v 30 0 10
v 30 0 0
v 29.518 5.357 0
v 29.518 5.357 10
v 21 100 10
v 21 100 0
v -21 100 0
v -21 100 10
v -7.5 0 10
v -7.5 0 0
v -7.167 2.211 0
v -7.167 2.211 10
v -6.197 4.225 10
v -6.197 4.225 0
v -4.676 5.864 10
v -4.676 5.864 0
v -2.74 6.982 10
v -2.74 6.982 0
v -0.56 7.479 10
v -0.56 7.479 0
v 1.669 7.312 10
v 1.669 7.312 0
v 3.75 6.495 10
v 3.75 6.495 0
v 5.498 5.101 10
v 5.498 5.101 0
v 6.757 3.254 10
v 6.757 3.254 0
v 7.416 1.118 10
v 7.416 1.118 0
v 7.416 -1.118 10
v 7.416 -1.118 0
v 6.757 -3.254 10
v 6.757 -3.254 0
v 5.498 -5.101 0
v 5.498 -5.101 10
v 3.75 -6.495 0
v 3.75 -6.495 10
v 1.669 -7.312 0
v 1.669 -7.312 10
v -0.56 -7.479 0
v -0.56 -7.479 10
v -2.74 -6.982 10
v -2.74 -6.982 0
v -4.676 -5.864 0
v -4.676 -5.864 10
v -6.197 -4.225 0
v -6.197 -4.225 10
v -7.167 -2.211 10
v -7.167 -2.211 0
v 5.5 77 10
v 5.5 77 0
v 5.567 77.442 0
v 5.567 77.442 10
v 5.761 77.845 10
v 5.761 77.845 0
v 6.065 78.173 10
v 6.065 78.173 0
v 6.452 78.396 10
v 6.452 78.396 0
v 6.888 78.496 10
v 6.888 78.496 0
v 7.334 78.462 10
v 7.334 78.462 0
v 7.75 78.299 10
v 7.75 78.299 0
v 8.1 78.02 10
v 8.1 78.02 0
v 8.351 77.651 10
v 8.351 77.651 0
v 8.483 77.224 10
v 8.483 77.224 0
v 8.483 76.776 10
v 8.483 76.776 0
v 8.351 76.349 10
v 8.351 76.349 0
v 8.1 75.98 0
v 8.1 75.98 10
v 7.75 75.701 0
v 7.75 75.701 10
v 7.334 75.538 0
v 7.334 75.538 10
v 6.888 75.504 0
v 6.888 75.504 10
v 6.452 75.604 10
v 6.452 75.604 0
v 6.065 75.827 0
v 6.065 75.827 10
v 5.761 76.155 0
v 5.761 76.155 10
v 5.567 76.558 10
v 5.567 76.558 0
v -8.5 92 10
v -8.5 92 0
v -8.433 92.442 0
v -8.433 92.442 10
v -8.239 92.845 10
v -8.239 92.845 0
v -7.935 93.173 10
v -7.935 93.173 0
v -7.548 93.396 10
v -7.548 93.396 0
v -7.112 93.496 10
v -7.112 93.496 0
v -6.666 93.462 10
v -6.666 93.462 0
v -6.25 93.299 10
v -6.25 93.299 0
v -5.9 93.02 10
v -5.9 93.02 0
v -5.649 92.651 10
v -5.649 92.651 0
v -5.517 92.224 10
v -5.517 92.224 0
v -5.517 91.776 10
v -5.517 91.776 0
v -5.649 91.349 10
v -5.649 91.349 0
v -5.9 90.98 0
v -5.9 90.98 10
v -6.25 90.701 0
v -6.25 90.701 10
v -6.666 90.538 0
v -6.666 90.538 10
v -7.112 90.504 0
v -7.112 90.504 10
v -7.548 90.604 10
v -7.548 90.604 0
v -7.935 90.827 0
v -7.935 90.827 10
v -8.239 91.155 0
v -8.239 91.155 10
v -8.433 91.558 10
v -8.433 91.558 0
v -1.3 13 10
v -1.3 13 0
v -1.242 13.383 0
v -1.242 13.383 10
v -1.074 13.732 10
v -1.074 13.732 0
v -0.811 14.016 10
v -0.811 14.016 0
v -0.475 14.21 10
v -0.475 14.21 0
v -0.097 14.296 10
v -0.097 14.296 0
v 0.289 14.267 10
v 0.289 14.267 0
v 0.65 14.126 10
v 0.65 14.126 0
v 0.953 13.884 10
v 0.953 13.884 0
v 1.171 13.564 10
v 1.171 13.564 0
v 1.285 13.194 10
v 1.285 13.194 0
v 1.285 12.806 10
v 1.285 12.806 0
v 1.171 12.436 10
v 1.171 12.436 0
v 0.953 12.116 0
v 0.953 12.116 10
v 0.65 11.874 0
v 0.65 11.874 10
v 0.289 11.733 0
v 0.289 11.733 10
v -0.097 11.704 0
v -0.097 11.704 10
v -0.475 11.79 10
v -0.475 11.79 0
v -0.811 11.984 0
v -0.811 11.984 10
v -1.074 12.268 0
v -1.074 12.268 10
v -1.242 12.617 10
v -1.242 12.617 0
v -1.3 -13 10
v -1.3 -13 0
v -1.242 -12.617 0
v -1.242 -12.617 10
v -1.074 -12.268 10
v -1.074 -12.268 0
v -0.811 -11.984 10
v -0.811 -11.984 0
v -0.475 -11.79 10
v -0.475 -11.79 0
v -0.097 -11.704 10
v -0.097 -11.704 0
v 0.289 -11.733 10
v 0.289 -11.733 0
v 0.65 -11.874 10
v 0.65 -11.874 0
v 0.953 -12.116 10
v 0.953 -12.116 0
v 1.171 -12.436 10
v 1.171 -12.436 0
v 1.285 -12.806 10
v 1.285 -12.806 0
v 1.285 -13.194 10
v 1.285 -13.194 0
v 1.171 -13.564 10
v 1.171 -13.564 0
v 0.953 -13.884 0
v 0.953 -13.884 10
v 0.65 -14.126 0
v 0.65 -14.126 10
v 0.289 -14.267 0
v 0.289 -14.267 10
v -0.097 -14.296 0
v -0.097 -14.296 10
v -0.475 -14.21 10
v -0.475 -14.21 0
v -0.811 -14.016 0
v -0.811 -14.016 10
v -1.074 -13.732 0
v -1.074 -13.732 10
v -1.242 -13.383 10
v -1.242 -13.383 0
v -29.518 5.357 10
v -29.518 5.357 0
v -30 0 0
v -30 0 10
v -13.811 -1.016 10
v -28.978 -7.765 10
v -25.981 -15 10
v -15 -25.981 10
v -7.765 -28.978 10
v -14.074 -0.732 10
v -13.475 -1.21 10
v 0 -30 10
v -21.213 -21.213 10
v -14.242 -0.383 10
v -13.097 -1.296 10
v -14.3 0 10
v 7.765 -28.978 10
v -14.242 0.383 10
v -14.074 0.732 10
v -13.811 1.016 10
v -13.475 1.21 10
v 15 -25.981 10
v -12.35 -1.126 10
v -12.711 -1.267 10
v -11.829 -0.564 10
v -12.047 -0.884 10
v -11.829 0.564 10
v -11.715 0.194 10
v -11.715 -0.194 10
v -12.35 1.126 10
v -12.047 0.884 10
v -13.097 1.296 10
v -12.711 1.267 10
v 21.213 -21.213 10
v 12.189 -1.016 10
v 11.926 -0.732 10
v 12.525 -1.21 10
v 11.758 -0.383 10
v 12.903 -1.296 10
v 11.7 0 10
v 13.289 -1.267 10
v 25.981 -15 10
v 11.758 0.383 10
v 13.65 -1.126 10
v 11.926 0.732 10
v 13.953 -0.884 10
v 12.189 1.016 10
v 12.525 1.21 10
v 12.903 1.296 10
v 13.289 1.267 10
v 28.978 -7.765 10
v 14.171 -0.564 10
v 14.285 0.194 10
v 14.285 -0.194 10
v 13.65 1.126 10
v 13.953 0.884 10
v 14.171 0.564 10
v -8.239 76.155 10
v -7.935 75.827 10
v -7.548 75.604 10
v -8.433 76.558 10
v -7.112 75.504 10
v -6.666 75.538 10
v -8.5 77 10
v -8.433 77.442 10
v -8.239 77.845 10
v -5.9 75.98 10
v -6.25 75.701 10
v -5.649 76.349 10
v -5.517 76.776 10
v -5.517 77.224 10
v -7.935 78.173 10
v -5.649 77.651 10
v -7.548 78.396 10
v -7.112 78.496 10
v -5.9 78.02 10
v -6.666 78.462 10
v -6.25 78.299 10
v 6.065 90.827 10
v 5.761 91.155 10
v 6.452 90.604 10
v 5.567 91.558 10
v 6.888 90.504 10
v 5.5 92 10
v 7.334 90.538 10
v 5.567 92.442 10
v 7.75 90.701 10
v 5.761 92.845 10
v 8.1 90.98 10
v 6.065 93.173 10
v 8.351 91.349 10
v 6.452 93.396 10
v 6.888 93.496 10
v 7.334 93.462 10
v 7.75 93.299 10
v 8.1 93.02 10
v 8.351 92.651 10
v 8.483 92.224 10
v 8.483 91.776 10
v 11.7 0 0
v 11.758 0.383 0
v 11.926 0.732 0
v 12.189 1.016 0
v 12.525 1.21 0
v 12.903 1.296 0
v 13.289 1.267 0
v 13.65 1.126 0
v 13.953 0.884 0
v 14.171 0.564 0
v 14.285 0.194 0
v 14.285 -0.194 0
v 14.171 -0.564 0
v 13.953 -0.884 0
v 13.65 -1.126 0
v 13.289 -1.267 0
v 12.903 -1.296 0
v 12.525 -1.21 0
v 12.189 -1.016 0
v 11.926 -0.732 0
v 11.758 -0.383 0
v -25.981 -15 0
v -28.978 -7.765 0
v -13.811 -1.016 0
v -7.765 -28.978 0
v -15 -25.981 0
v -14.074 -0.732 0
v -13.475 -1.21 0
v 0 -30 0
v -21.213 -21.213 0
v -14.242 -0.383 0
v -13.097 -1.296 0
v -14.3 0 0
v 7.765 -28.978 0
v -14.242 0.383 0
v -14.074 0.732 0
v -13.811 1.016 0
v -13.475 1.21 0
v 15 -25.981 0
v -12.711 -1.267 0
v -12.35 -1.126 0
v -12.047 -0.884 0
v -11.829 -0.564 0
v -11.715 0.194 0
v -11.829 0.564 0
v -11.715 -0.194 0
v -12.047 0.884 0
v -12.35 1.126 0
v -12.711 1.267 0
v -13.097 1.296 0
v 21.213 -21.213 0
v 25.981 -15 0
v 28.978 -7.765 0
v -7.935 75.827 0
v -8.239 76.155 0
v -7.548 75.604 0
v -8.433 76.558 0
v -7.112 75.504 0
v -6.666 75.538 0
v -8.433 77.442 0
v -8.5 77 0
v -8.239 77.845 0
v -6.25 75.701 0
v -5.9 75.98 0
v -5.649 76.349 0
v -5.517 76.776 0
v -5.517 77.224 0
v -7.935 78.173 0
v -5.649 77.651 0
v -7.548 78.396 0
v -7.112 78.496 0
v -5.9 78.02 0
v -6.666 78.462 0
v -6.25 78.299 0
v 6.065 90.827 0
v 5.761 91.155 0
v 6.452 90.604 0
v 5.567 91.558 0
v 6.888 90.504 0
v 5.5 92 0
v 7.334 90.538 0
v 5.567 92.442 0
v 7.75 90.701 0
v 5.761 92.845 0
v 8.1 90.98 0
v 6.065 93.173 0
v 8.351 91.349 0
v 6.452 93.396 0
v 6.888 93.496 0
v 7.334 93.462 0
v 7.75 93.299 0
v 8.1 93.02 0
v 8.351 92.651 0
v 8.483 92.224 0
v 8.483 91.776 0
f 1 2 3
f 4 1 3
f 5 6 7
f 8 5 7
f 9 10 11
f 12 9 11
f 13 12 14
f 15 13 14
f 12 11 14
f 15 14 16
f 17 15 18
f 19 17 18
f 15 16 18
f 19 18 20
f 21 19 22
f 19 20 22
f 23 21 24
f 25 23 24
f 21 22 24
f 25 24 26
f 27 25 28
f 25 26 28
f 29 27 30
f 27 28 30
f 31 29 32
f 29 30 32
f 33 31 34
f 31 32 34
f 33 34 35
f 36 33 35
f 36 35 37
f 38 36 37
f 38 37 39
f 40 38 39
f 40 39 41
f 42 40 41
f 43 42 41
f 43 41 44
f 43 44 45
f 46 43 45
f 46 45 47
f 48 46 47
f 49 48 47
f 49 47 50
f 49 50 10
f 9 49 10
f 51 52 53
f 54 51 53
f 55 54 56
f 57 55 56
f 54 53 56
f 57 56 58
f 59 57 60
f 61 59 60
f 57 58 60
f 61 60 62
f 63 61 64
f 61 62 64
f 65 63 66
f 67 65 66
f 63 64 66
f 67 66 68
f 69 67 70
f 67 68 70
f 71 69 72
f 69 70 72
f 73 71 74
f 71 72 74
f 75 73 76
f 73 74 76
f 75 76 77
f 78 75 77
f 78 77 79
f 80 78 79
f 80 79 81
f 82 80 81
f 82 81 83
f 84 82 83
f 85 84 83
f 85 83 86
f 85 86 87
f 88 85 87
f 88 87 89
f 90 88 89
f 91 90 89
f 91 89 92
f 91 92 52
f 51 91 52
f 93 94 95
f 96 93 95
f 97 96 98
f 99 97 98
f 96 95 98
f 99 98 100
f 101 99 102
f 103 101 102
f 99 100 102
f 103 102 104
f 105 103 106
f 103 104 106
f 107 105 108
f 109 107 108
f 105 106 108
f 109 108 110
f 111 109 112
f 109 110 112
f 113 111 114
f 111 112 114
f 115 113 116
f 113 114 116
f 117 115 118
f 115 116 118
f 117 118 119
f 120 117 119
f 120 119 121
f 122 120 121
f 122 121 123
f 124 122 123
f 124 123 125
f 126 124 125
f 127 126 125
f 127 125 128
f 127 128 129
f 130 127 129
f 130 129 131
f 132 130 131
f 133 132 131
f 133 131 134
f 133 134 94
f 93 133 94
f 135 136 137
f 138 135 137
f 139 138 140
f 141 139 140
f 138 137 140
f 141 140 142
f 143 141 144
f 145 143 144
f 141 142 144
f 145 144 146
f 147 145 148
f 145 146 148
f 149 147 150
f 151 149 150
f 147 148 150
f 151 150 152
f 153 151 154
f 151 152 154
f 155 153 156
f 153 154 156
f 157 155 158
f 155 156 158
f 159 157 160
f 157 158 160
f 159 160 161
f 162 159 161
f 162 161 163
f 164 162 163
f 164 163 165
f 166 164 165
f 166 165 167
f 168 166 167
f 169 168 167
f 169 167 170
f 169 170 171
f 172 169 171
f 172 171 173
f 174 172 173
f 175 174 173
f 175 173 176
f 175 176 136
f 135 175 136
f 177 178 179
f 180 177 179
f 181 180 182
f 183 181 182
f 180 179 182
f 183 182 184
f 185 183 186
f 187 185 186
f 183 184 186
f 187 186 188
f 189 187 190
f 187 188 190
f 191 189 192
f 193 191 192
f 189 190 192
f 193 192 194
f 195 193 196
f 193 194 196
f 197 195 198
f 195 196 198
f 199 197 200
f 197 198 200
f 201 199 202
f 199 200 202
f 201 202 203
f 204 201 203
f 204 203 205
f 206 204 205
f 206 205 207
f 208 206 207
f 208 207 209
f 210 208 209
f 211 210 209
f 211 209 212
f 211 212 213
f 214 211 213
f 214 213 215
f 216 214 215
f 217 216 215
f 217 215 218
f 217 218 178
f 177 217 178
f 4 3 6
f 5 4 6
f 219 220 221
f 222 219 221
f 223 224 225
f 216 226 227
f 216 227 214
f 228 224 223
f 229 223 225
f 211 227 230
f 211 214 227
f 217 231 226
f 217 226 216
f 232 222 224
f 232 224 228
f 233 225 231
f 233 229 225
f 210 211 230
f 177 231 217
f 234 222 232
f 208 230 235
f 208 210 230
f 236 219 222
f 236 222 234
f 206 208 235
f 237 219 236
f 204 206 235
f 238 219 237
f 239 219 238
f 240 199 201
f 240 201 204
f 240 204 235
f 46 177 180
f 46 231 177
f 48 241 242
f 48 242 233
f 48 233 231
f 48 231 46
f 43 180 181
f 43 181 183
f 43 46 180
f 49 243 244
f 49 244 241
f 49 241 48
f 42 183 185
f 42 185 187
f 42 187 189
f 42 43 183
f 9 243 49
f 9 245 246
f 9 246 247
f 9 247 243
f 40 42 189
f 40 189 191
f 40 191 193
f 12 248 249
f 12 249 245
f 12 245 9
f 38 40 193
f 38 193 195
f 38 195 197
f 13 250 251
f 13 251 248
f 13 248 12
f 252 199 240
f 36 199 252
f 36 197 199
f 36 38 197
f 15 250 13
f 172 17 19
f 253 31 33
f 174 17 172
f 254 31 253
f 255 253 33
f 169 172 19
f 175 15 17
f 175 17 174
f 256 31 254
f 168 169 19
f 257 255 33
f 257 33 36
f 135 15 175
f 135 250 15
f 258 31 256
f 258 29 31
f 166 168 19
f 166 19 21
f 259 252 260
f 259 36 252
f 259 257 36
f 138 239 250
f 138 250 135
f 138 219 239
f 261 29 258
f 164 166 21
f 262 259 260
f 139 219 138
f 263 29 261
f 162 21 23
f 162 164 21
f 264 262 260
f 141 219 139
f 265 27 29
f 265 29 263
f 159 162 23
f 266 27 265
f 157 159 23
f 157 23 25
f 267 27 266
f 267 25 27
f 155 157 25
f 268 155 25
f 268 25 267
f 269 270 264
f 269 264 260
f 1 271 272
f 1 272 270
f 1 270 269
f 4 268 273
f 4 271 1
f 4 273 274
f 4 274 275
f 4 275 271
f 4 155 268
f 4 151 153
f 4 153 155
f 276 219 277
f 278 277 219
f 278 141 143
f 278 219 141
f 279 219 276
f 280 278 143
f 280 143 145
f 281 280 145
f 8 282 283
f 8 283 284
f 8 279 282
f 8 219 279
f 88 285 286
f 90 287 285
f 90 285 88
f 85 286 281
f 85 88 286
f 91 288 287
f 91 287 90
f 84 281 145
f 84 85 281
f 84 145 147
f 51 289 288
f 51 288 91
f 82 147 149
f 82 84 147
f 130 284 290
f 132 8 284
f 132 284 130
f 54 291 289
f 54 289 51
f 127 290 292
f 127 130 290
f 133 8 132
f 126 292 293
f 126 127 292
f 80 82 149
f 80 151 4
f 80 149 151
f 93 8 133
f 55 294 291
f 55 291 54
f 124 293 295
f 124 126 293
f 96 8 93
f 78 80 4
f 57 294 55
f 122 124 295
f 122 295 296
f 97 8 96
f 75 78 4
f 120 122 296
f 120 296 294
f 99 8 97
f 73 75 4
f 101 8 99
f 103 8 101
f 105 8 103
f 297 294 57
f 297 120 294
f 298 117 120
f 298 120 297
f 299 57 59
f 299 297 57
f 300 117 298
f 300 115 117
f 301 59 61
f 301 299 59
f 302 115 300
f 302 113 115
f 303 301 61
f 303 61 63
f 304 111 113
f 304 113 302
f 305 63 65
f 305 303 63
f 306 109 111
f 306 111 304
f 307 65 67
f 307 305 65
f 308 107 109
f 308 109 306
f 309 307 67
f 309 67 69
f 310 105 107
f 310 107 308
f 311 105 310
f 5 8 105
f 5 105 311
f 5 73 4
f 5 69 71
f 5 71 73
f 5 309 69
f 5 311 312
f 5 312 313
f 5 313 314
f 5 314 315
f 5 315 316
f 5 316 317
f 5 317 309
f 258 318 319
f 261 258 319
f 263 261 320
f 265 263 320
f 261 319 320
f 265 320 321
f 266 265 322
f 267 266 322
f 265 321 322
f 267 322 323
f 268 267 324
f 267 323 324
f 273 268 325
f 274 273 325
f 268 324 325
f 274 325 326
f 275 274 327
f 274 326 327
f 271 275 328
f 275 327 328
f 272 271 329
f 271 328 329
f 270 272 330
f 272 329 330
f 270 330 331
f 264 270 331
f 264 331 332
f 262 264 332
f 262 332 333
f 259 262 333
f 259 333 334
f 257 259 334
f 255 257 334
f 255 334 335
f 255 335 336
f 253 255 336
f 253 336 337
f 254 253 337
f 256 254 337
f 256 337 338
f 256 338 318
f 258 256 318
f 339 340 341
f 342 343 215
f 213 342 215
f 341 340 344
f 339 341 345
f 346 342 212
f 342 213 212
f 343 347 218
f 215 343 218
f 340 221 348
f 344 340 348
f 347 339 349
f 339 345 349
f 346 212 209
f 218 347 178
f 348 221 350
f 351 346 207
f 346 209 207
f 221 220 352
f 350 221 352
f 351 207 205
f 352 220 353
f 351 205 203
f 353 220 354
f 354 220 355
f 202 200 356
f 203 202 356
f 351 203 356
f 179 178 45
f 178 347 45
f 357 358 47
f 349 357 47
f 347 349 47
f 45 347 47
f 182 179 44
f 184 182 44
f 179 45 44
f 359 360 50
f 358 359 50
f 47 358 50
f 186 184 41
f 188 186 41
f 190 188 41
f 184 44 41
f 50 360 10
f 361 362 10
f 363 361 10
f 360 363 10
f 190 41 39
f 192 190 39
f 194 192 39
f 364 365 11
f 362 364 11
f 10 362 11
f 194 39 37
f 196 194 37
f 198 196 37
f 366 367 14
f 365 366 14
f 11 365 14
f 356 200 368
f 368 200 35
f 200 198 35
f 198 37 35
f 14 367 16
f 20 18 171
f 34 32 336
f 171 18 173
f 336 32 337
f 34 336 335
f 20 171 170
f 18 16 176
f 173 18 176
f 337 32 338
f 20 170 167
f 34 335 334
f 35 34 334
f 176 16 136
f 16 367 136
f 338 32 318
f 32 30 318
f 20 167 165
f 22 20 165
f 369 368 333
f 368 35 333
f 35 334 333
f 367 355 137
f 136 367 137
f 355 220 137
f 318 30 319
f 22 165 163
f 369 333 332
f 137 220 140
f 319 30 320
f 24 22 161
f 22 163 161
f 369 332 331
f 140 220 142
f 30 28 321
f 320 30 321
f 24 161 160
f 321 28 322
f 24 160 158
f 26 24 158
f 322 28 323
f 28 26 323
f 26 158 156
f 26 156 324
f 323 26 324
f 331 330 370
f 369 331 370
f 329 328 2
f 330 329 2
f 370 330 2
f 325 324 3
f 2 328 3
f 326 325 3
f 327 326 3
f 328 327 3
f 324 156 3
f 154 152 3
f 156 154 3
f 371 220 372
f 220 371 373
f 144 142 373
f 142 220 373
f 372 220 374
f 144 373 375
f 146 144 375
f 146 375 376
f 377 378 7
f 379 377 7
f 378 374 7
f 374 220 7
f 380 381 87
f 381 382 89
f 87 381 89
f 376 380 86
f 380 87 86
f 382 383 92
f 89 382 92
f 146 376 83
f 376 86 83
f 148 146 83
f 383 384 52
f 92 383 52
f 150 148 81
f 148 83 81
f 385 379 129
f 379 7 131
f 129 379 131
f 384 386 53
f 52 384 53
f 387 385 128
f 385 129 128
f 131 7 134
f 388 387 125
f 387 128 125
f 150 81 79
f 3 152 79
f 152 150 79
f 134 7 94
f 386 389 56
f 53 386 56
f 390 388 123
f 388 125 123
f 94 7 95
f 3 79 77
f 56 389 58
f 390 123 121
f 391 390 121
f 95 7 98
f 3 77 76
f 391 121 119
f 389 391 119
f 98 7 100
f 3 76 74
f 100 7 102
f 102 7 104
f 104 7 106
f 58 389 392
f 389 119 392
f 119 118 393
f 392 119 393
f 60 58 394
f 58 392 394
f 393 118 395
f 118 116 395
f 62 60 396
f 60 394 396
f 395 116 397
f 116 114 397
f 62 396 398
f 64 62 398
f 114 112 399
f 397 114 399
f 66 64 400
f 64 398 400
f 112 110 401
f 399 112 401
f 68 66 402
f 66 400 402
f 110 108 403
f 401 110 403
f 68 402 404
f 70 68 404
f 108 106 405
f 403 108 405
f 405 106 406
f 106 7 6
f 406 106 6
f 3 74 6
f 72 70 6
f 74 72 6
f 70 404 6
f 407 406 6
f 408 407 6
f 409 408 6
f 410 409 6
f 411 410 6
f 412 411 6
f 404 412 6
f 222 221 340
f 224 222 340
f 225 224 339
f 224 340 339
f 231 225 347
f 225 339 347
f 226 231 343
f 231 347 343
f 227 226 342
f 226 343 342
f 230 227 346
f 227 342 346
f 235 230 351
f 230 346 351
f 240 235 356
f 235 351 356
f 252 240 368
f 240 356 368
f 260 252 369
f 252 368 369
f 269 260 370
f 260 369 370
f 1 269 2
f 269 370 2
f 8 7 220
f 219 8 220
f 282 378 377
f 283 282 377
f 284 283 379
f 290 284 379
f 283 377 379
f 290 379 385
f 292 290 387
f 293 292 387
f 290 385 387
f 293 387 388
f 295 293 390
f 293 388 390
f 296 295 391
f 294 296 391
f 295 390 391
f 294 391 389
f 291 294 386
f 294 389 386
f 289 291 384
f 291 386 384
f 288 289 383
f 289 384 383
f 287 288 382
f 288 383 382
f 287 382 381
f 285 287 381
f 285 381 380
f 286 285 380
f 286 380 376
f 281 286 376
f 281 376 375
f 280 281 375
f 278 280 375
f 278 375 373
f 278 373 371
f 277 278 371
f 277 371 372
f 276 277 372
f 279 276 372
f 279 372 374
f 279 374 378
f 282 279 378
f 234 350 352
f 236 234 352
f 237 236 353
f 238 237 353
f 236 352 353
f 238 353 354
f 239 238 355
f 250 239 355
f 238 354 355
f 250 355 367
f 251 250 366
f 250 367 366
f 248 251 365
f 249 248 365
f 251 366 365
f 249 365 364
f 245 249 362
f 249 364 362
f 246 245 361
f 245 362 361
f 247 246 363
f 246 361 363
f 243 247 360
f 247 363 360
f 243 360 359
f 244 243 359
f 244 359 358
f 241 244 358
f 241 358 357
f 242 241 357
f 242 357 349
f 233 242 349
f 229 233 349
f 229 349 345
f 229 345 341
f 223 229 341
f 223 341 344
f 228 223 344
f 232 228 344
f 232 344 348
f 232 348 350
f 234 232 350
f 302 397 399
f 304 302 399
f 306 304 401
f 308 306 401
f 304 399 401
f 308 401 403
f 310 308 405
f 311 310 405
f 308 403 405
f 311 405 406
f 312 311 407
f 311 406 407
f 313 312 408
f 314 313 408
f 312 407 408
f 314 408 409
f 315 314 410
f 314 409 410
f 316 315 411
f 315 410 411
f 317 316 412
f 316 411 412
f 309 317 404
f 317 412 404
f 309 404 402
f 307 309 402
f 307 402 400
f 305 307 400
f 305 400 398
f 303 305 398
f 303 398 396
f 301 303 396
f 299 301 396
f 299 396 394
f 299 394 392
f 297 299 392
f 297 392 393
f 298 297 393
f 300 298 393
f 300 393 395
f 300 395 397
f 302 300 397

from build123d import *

# Parameters (mm, degrees)
BOSS_EXTRUDE1_DEPTH = 10
CUT_EXTRUDE1_REACH  = 12
SKETCH2_R           = 1.5
CUT_EXTRUDE2_REACH  = 12
SKETCH3_R           = 1.3
SKETCH3_R_2         = 7.5


with BuildPart() as part:
    # Sketch1 → Boss-Extrude1 (new body)
    with BuildSketch(Plane.XY):
        with BuildLine():
            Line((-21, 100), (-29.51790497, 5.356611447))
            ThreePointArc((-29.51790497, 5.356611447), (0, 30), (29.51790497, 5.356611447))
            Line((29.51790497, 5.356611447), (21, 100))
            Line((21, 100), (-21, 100))
        make_face()
        with BuildLine():
            Line((-29.51790497, 5.356611447), (-30, 0))
            ThreePointArc((-30, 0), (0, -30), (30, 0))
            Line((30, 0), (29.51790497, 5.356611447))
            ThreePointArc((29.51790497, 5.356611447), (0, 30), (-29.51790497, 5.356611447))
        make_face()
    extrude(amount=BOSS_EXTRUDE1_DEPTH)

    # Sketch2 → Cut-Extrude1 (cut, up to next)
    with BuildSketch(Plane(origin=(0, 0, 0), x_dir=(-1, 0, 0), z_dir=(0, 0, -1)), mode=Mode.PRIVATE) as cut_extrude1_sk1:
        with Locations((7, 92)):
            Circle(SKETCH2_R)
    cut_extrude1_tool1 = extrude(cut_extrude1_sk1.sketch, amount=-CUT_EXTRUDE1_REACH, mode=Mode.PRIVATE) & part.part
    add(cut_extrude1_tool1.solids().sort_by_distance((-7, 92, 0))[0], mode=Mode.SUBTRACT)
    # Sketch2 → Cut-Extrude1 (cut, up to next)
    with BuildSketch(Plane(origin=(0, 0, 0), x_dir=(-1, 0, 0), z_dir=(0, 0, -1)), mode=Mode.PRIVATE) as cut_extrude1_sk2:
        with Locations((7, 77)):
            Circle(SKETCH2_R)
    cut_extrude1_tool2 = extrude(cut_extrude1_sk2.sketch, amount=-CUT_EXTRUDE1_REACH, mode=Mode.PRIVATE) & part.part
    add(cut_extrude1_tool2.solids().sort_by_distance((-7, 77, 0))[0], mode=Mode.SUBTRACT)
    # Sketch2 → Cut-Extrude1 (cut, up to next)
    with BuildSketch(Plane(origin=(0, 0, 0), x_dir=(-1, 0, 0), z_dir=(0, 0, -1)), mode=Mode.PRIVATE) as cut_extrude1_sk3:
        with Locations((-7, 77)):
            Circle(SKETCH2_R)
    cut_extrude1_tool3 = extrude(cut_extrude1_sk3.sketch, amount=-CUT_EXTRUDE1_REACH, mode=Mode.PRIVATE) & part.part
    add(cut_extrude1_tool3.solids().sort_by_distance((7, 77, 0))[0], mode=Mode.SUBTRACT)
    # Sketch2 → Cut-Extrude1 (cut, up to next)
    with BuildSketch(Plane(origin=(0, 0, 0), x_dir=(-1, 0, 0), z_dir=(0, 0, -1)), mode=Mode.PRIVATE) as cut_extrude1_sk4:
        with Locations((-7, 92)):
            Circle(SKETCH2_R)
    cut_extrude1_tool4 = extrude(cut_extrude1_sk4.sketch, amount=-CUT_EXTRUDE1_REACH, mode=Mode.PRIVATE) & part.part
    add(cut_extrude1_tool4.solids().sort_by_distance((7, 92, 0))[0], mode=Mode.SUBTRACT)

    # Sketch3 → Cut-Extrude2 (cut, up to next)
    with BuildSketch(Plane(origin=(0, 0, 0), x_dir=(-1, 0, 0), z_dir=(0, 0, -1)), mode=Mode.PRIVATE) as cut_extrude2_sk1:
        with Locations((0, 13)):
            Circle(SKETCH3_R)
    cut_extrude2_tool1 = extrude(cut_extrude2_sk1.sketch, amount=-CUT_EXTRUDE2_REACH, mode=Mode.PRIVATE) & part.part
    add(cut_extrude2_tool1.solids().sort_by_distance((0, 13, 0))[0], mode=Mode.SUBTRACT)
    # Sketch3 → Cut-Extrude2 (cut, up to next)
    with BuildSketch(Plane(origin=(0, 0, 0), x_dir=(-1, 0, 0), z_dir=(0, 0, -1)), mode=Mode.PRIVATE) as cut_extrude2_sk2:
        with Locations((13, 0)):
            Circle(SKETCH3_R)
    cut_extrude2_tool2 = extrude(cut_extrude2_sk2.sketch, amount=-CUT_EXTRUDE2_REACH, mode=Mode.PRIVATE) & part.part
    add(cut_extrude2_tool2.solids().sort_by_distance((-13, 0, 0))[0], mode=Mode.SUBTRACT)
    # Sketch3 → Cut-Extrude2 (cut, up to next)
    with BuildSketch(Plane(origin=(0, 0, 0), x_dir=(-1, 0, 0), z_dir=(0, 0, -1)), mode=Mode.PRIVATE) as cut_extrude2_sk3:
        with Locations((0, -13)):
            Circle(SKETCH3_R)
    cut_extrude2_tool3 = extrude(cut_extrude2_sk3.sketch, amount=-CUT_EXTRUDE2_REACH, mode=Mode.PRIVATE) & part.part
    add(cut_extrude2_tool3.solids().sort_by_distance((0, -13, 0))[0], mode=Mode.SUBTRACT)
    # Sketch3 → Cut-Extrude2 (cut, up to next)
    with BuildSketch(Plane(origin=(0, 0, 0), x_dir=(-1, 0, 0), z_dir=(0, 0, -1)), mode=Mode.PRIVATE) as cut_extrude2_sk4:
        with Locations((-13, 0)):
            Circle(SKETCH3_R)
    cut_extrude2_tool4 = extrude(cut_extrude2_sk4.sketch, amount=-CUT_EXTRUDE2_REACH, mode=Mode.PRIVATE) & part.part
    add(cut_extrude2_tool4.solids().sort_by_distance((13, 0, 0))[0], mode=Mode.SUBTRACT)
    # Sketch3 → Cut-Extrude2 (cut, up to next)
    with BuildSketch(Plane(origin=(0, 0, 0), x_dir=(-1, 0, 0), z_dir=(0, 0, -1)), mode=Mode.PRIVATE) as cut_extrude2_sk5:
        Circle(SKETCH3_R_2)
    cut_extrude2_tool5 = extrude(cut_extrude2_sk5.sketch, amount=-CUT_EXTRUDE2_REACH, mode=Mode.PRIVATE) & part.part
    add(cut_extrude2_tool5.solids().sort_by_distance((0, 0, 0))[0], mode=Mode.SUBTRACT)


solid = part.part
